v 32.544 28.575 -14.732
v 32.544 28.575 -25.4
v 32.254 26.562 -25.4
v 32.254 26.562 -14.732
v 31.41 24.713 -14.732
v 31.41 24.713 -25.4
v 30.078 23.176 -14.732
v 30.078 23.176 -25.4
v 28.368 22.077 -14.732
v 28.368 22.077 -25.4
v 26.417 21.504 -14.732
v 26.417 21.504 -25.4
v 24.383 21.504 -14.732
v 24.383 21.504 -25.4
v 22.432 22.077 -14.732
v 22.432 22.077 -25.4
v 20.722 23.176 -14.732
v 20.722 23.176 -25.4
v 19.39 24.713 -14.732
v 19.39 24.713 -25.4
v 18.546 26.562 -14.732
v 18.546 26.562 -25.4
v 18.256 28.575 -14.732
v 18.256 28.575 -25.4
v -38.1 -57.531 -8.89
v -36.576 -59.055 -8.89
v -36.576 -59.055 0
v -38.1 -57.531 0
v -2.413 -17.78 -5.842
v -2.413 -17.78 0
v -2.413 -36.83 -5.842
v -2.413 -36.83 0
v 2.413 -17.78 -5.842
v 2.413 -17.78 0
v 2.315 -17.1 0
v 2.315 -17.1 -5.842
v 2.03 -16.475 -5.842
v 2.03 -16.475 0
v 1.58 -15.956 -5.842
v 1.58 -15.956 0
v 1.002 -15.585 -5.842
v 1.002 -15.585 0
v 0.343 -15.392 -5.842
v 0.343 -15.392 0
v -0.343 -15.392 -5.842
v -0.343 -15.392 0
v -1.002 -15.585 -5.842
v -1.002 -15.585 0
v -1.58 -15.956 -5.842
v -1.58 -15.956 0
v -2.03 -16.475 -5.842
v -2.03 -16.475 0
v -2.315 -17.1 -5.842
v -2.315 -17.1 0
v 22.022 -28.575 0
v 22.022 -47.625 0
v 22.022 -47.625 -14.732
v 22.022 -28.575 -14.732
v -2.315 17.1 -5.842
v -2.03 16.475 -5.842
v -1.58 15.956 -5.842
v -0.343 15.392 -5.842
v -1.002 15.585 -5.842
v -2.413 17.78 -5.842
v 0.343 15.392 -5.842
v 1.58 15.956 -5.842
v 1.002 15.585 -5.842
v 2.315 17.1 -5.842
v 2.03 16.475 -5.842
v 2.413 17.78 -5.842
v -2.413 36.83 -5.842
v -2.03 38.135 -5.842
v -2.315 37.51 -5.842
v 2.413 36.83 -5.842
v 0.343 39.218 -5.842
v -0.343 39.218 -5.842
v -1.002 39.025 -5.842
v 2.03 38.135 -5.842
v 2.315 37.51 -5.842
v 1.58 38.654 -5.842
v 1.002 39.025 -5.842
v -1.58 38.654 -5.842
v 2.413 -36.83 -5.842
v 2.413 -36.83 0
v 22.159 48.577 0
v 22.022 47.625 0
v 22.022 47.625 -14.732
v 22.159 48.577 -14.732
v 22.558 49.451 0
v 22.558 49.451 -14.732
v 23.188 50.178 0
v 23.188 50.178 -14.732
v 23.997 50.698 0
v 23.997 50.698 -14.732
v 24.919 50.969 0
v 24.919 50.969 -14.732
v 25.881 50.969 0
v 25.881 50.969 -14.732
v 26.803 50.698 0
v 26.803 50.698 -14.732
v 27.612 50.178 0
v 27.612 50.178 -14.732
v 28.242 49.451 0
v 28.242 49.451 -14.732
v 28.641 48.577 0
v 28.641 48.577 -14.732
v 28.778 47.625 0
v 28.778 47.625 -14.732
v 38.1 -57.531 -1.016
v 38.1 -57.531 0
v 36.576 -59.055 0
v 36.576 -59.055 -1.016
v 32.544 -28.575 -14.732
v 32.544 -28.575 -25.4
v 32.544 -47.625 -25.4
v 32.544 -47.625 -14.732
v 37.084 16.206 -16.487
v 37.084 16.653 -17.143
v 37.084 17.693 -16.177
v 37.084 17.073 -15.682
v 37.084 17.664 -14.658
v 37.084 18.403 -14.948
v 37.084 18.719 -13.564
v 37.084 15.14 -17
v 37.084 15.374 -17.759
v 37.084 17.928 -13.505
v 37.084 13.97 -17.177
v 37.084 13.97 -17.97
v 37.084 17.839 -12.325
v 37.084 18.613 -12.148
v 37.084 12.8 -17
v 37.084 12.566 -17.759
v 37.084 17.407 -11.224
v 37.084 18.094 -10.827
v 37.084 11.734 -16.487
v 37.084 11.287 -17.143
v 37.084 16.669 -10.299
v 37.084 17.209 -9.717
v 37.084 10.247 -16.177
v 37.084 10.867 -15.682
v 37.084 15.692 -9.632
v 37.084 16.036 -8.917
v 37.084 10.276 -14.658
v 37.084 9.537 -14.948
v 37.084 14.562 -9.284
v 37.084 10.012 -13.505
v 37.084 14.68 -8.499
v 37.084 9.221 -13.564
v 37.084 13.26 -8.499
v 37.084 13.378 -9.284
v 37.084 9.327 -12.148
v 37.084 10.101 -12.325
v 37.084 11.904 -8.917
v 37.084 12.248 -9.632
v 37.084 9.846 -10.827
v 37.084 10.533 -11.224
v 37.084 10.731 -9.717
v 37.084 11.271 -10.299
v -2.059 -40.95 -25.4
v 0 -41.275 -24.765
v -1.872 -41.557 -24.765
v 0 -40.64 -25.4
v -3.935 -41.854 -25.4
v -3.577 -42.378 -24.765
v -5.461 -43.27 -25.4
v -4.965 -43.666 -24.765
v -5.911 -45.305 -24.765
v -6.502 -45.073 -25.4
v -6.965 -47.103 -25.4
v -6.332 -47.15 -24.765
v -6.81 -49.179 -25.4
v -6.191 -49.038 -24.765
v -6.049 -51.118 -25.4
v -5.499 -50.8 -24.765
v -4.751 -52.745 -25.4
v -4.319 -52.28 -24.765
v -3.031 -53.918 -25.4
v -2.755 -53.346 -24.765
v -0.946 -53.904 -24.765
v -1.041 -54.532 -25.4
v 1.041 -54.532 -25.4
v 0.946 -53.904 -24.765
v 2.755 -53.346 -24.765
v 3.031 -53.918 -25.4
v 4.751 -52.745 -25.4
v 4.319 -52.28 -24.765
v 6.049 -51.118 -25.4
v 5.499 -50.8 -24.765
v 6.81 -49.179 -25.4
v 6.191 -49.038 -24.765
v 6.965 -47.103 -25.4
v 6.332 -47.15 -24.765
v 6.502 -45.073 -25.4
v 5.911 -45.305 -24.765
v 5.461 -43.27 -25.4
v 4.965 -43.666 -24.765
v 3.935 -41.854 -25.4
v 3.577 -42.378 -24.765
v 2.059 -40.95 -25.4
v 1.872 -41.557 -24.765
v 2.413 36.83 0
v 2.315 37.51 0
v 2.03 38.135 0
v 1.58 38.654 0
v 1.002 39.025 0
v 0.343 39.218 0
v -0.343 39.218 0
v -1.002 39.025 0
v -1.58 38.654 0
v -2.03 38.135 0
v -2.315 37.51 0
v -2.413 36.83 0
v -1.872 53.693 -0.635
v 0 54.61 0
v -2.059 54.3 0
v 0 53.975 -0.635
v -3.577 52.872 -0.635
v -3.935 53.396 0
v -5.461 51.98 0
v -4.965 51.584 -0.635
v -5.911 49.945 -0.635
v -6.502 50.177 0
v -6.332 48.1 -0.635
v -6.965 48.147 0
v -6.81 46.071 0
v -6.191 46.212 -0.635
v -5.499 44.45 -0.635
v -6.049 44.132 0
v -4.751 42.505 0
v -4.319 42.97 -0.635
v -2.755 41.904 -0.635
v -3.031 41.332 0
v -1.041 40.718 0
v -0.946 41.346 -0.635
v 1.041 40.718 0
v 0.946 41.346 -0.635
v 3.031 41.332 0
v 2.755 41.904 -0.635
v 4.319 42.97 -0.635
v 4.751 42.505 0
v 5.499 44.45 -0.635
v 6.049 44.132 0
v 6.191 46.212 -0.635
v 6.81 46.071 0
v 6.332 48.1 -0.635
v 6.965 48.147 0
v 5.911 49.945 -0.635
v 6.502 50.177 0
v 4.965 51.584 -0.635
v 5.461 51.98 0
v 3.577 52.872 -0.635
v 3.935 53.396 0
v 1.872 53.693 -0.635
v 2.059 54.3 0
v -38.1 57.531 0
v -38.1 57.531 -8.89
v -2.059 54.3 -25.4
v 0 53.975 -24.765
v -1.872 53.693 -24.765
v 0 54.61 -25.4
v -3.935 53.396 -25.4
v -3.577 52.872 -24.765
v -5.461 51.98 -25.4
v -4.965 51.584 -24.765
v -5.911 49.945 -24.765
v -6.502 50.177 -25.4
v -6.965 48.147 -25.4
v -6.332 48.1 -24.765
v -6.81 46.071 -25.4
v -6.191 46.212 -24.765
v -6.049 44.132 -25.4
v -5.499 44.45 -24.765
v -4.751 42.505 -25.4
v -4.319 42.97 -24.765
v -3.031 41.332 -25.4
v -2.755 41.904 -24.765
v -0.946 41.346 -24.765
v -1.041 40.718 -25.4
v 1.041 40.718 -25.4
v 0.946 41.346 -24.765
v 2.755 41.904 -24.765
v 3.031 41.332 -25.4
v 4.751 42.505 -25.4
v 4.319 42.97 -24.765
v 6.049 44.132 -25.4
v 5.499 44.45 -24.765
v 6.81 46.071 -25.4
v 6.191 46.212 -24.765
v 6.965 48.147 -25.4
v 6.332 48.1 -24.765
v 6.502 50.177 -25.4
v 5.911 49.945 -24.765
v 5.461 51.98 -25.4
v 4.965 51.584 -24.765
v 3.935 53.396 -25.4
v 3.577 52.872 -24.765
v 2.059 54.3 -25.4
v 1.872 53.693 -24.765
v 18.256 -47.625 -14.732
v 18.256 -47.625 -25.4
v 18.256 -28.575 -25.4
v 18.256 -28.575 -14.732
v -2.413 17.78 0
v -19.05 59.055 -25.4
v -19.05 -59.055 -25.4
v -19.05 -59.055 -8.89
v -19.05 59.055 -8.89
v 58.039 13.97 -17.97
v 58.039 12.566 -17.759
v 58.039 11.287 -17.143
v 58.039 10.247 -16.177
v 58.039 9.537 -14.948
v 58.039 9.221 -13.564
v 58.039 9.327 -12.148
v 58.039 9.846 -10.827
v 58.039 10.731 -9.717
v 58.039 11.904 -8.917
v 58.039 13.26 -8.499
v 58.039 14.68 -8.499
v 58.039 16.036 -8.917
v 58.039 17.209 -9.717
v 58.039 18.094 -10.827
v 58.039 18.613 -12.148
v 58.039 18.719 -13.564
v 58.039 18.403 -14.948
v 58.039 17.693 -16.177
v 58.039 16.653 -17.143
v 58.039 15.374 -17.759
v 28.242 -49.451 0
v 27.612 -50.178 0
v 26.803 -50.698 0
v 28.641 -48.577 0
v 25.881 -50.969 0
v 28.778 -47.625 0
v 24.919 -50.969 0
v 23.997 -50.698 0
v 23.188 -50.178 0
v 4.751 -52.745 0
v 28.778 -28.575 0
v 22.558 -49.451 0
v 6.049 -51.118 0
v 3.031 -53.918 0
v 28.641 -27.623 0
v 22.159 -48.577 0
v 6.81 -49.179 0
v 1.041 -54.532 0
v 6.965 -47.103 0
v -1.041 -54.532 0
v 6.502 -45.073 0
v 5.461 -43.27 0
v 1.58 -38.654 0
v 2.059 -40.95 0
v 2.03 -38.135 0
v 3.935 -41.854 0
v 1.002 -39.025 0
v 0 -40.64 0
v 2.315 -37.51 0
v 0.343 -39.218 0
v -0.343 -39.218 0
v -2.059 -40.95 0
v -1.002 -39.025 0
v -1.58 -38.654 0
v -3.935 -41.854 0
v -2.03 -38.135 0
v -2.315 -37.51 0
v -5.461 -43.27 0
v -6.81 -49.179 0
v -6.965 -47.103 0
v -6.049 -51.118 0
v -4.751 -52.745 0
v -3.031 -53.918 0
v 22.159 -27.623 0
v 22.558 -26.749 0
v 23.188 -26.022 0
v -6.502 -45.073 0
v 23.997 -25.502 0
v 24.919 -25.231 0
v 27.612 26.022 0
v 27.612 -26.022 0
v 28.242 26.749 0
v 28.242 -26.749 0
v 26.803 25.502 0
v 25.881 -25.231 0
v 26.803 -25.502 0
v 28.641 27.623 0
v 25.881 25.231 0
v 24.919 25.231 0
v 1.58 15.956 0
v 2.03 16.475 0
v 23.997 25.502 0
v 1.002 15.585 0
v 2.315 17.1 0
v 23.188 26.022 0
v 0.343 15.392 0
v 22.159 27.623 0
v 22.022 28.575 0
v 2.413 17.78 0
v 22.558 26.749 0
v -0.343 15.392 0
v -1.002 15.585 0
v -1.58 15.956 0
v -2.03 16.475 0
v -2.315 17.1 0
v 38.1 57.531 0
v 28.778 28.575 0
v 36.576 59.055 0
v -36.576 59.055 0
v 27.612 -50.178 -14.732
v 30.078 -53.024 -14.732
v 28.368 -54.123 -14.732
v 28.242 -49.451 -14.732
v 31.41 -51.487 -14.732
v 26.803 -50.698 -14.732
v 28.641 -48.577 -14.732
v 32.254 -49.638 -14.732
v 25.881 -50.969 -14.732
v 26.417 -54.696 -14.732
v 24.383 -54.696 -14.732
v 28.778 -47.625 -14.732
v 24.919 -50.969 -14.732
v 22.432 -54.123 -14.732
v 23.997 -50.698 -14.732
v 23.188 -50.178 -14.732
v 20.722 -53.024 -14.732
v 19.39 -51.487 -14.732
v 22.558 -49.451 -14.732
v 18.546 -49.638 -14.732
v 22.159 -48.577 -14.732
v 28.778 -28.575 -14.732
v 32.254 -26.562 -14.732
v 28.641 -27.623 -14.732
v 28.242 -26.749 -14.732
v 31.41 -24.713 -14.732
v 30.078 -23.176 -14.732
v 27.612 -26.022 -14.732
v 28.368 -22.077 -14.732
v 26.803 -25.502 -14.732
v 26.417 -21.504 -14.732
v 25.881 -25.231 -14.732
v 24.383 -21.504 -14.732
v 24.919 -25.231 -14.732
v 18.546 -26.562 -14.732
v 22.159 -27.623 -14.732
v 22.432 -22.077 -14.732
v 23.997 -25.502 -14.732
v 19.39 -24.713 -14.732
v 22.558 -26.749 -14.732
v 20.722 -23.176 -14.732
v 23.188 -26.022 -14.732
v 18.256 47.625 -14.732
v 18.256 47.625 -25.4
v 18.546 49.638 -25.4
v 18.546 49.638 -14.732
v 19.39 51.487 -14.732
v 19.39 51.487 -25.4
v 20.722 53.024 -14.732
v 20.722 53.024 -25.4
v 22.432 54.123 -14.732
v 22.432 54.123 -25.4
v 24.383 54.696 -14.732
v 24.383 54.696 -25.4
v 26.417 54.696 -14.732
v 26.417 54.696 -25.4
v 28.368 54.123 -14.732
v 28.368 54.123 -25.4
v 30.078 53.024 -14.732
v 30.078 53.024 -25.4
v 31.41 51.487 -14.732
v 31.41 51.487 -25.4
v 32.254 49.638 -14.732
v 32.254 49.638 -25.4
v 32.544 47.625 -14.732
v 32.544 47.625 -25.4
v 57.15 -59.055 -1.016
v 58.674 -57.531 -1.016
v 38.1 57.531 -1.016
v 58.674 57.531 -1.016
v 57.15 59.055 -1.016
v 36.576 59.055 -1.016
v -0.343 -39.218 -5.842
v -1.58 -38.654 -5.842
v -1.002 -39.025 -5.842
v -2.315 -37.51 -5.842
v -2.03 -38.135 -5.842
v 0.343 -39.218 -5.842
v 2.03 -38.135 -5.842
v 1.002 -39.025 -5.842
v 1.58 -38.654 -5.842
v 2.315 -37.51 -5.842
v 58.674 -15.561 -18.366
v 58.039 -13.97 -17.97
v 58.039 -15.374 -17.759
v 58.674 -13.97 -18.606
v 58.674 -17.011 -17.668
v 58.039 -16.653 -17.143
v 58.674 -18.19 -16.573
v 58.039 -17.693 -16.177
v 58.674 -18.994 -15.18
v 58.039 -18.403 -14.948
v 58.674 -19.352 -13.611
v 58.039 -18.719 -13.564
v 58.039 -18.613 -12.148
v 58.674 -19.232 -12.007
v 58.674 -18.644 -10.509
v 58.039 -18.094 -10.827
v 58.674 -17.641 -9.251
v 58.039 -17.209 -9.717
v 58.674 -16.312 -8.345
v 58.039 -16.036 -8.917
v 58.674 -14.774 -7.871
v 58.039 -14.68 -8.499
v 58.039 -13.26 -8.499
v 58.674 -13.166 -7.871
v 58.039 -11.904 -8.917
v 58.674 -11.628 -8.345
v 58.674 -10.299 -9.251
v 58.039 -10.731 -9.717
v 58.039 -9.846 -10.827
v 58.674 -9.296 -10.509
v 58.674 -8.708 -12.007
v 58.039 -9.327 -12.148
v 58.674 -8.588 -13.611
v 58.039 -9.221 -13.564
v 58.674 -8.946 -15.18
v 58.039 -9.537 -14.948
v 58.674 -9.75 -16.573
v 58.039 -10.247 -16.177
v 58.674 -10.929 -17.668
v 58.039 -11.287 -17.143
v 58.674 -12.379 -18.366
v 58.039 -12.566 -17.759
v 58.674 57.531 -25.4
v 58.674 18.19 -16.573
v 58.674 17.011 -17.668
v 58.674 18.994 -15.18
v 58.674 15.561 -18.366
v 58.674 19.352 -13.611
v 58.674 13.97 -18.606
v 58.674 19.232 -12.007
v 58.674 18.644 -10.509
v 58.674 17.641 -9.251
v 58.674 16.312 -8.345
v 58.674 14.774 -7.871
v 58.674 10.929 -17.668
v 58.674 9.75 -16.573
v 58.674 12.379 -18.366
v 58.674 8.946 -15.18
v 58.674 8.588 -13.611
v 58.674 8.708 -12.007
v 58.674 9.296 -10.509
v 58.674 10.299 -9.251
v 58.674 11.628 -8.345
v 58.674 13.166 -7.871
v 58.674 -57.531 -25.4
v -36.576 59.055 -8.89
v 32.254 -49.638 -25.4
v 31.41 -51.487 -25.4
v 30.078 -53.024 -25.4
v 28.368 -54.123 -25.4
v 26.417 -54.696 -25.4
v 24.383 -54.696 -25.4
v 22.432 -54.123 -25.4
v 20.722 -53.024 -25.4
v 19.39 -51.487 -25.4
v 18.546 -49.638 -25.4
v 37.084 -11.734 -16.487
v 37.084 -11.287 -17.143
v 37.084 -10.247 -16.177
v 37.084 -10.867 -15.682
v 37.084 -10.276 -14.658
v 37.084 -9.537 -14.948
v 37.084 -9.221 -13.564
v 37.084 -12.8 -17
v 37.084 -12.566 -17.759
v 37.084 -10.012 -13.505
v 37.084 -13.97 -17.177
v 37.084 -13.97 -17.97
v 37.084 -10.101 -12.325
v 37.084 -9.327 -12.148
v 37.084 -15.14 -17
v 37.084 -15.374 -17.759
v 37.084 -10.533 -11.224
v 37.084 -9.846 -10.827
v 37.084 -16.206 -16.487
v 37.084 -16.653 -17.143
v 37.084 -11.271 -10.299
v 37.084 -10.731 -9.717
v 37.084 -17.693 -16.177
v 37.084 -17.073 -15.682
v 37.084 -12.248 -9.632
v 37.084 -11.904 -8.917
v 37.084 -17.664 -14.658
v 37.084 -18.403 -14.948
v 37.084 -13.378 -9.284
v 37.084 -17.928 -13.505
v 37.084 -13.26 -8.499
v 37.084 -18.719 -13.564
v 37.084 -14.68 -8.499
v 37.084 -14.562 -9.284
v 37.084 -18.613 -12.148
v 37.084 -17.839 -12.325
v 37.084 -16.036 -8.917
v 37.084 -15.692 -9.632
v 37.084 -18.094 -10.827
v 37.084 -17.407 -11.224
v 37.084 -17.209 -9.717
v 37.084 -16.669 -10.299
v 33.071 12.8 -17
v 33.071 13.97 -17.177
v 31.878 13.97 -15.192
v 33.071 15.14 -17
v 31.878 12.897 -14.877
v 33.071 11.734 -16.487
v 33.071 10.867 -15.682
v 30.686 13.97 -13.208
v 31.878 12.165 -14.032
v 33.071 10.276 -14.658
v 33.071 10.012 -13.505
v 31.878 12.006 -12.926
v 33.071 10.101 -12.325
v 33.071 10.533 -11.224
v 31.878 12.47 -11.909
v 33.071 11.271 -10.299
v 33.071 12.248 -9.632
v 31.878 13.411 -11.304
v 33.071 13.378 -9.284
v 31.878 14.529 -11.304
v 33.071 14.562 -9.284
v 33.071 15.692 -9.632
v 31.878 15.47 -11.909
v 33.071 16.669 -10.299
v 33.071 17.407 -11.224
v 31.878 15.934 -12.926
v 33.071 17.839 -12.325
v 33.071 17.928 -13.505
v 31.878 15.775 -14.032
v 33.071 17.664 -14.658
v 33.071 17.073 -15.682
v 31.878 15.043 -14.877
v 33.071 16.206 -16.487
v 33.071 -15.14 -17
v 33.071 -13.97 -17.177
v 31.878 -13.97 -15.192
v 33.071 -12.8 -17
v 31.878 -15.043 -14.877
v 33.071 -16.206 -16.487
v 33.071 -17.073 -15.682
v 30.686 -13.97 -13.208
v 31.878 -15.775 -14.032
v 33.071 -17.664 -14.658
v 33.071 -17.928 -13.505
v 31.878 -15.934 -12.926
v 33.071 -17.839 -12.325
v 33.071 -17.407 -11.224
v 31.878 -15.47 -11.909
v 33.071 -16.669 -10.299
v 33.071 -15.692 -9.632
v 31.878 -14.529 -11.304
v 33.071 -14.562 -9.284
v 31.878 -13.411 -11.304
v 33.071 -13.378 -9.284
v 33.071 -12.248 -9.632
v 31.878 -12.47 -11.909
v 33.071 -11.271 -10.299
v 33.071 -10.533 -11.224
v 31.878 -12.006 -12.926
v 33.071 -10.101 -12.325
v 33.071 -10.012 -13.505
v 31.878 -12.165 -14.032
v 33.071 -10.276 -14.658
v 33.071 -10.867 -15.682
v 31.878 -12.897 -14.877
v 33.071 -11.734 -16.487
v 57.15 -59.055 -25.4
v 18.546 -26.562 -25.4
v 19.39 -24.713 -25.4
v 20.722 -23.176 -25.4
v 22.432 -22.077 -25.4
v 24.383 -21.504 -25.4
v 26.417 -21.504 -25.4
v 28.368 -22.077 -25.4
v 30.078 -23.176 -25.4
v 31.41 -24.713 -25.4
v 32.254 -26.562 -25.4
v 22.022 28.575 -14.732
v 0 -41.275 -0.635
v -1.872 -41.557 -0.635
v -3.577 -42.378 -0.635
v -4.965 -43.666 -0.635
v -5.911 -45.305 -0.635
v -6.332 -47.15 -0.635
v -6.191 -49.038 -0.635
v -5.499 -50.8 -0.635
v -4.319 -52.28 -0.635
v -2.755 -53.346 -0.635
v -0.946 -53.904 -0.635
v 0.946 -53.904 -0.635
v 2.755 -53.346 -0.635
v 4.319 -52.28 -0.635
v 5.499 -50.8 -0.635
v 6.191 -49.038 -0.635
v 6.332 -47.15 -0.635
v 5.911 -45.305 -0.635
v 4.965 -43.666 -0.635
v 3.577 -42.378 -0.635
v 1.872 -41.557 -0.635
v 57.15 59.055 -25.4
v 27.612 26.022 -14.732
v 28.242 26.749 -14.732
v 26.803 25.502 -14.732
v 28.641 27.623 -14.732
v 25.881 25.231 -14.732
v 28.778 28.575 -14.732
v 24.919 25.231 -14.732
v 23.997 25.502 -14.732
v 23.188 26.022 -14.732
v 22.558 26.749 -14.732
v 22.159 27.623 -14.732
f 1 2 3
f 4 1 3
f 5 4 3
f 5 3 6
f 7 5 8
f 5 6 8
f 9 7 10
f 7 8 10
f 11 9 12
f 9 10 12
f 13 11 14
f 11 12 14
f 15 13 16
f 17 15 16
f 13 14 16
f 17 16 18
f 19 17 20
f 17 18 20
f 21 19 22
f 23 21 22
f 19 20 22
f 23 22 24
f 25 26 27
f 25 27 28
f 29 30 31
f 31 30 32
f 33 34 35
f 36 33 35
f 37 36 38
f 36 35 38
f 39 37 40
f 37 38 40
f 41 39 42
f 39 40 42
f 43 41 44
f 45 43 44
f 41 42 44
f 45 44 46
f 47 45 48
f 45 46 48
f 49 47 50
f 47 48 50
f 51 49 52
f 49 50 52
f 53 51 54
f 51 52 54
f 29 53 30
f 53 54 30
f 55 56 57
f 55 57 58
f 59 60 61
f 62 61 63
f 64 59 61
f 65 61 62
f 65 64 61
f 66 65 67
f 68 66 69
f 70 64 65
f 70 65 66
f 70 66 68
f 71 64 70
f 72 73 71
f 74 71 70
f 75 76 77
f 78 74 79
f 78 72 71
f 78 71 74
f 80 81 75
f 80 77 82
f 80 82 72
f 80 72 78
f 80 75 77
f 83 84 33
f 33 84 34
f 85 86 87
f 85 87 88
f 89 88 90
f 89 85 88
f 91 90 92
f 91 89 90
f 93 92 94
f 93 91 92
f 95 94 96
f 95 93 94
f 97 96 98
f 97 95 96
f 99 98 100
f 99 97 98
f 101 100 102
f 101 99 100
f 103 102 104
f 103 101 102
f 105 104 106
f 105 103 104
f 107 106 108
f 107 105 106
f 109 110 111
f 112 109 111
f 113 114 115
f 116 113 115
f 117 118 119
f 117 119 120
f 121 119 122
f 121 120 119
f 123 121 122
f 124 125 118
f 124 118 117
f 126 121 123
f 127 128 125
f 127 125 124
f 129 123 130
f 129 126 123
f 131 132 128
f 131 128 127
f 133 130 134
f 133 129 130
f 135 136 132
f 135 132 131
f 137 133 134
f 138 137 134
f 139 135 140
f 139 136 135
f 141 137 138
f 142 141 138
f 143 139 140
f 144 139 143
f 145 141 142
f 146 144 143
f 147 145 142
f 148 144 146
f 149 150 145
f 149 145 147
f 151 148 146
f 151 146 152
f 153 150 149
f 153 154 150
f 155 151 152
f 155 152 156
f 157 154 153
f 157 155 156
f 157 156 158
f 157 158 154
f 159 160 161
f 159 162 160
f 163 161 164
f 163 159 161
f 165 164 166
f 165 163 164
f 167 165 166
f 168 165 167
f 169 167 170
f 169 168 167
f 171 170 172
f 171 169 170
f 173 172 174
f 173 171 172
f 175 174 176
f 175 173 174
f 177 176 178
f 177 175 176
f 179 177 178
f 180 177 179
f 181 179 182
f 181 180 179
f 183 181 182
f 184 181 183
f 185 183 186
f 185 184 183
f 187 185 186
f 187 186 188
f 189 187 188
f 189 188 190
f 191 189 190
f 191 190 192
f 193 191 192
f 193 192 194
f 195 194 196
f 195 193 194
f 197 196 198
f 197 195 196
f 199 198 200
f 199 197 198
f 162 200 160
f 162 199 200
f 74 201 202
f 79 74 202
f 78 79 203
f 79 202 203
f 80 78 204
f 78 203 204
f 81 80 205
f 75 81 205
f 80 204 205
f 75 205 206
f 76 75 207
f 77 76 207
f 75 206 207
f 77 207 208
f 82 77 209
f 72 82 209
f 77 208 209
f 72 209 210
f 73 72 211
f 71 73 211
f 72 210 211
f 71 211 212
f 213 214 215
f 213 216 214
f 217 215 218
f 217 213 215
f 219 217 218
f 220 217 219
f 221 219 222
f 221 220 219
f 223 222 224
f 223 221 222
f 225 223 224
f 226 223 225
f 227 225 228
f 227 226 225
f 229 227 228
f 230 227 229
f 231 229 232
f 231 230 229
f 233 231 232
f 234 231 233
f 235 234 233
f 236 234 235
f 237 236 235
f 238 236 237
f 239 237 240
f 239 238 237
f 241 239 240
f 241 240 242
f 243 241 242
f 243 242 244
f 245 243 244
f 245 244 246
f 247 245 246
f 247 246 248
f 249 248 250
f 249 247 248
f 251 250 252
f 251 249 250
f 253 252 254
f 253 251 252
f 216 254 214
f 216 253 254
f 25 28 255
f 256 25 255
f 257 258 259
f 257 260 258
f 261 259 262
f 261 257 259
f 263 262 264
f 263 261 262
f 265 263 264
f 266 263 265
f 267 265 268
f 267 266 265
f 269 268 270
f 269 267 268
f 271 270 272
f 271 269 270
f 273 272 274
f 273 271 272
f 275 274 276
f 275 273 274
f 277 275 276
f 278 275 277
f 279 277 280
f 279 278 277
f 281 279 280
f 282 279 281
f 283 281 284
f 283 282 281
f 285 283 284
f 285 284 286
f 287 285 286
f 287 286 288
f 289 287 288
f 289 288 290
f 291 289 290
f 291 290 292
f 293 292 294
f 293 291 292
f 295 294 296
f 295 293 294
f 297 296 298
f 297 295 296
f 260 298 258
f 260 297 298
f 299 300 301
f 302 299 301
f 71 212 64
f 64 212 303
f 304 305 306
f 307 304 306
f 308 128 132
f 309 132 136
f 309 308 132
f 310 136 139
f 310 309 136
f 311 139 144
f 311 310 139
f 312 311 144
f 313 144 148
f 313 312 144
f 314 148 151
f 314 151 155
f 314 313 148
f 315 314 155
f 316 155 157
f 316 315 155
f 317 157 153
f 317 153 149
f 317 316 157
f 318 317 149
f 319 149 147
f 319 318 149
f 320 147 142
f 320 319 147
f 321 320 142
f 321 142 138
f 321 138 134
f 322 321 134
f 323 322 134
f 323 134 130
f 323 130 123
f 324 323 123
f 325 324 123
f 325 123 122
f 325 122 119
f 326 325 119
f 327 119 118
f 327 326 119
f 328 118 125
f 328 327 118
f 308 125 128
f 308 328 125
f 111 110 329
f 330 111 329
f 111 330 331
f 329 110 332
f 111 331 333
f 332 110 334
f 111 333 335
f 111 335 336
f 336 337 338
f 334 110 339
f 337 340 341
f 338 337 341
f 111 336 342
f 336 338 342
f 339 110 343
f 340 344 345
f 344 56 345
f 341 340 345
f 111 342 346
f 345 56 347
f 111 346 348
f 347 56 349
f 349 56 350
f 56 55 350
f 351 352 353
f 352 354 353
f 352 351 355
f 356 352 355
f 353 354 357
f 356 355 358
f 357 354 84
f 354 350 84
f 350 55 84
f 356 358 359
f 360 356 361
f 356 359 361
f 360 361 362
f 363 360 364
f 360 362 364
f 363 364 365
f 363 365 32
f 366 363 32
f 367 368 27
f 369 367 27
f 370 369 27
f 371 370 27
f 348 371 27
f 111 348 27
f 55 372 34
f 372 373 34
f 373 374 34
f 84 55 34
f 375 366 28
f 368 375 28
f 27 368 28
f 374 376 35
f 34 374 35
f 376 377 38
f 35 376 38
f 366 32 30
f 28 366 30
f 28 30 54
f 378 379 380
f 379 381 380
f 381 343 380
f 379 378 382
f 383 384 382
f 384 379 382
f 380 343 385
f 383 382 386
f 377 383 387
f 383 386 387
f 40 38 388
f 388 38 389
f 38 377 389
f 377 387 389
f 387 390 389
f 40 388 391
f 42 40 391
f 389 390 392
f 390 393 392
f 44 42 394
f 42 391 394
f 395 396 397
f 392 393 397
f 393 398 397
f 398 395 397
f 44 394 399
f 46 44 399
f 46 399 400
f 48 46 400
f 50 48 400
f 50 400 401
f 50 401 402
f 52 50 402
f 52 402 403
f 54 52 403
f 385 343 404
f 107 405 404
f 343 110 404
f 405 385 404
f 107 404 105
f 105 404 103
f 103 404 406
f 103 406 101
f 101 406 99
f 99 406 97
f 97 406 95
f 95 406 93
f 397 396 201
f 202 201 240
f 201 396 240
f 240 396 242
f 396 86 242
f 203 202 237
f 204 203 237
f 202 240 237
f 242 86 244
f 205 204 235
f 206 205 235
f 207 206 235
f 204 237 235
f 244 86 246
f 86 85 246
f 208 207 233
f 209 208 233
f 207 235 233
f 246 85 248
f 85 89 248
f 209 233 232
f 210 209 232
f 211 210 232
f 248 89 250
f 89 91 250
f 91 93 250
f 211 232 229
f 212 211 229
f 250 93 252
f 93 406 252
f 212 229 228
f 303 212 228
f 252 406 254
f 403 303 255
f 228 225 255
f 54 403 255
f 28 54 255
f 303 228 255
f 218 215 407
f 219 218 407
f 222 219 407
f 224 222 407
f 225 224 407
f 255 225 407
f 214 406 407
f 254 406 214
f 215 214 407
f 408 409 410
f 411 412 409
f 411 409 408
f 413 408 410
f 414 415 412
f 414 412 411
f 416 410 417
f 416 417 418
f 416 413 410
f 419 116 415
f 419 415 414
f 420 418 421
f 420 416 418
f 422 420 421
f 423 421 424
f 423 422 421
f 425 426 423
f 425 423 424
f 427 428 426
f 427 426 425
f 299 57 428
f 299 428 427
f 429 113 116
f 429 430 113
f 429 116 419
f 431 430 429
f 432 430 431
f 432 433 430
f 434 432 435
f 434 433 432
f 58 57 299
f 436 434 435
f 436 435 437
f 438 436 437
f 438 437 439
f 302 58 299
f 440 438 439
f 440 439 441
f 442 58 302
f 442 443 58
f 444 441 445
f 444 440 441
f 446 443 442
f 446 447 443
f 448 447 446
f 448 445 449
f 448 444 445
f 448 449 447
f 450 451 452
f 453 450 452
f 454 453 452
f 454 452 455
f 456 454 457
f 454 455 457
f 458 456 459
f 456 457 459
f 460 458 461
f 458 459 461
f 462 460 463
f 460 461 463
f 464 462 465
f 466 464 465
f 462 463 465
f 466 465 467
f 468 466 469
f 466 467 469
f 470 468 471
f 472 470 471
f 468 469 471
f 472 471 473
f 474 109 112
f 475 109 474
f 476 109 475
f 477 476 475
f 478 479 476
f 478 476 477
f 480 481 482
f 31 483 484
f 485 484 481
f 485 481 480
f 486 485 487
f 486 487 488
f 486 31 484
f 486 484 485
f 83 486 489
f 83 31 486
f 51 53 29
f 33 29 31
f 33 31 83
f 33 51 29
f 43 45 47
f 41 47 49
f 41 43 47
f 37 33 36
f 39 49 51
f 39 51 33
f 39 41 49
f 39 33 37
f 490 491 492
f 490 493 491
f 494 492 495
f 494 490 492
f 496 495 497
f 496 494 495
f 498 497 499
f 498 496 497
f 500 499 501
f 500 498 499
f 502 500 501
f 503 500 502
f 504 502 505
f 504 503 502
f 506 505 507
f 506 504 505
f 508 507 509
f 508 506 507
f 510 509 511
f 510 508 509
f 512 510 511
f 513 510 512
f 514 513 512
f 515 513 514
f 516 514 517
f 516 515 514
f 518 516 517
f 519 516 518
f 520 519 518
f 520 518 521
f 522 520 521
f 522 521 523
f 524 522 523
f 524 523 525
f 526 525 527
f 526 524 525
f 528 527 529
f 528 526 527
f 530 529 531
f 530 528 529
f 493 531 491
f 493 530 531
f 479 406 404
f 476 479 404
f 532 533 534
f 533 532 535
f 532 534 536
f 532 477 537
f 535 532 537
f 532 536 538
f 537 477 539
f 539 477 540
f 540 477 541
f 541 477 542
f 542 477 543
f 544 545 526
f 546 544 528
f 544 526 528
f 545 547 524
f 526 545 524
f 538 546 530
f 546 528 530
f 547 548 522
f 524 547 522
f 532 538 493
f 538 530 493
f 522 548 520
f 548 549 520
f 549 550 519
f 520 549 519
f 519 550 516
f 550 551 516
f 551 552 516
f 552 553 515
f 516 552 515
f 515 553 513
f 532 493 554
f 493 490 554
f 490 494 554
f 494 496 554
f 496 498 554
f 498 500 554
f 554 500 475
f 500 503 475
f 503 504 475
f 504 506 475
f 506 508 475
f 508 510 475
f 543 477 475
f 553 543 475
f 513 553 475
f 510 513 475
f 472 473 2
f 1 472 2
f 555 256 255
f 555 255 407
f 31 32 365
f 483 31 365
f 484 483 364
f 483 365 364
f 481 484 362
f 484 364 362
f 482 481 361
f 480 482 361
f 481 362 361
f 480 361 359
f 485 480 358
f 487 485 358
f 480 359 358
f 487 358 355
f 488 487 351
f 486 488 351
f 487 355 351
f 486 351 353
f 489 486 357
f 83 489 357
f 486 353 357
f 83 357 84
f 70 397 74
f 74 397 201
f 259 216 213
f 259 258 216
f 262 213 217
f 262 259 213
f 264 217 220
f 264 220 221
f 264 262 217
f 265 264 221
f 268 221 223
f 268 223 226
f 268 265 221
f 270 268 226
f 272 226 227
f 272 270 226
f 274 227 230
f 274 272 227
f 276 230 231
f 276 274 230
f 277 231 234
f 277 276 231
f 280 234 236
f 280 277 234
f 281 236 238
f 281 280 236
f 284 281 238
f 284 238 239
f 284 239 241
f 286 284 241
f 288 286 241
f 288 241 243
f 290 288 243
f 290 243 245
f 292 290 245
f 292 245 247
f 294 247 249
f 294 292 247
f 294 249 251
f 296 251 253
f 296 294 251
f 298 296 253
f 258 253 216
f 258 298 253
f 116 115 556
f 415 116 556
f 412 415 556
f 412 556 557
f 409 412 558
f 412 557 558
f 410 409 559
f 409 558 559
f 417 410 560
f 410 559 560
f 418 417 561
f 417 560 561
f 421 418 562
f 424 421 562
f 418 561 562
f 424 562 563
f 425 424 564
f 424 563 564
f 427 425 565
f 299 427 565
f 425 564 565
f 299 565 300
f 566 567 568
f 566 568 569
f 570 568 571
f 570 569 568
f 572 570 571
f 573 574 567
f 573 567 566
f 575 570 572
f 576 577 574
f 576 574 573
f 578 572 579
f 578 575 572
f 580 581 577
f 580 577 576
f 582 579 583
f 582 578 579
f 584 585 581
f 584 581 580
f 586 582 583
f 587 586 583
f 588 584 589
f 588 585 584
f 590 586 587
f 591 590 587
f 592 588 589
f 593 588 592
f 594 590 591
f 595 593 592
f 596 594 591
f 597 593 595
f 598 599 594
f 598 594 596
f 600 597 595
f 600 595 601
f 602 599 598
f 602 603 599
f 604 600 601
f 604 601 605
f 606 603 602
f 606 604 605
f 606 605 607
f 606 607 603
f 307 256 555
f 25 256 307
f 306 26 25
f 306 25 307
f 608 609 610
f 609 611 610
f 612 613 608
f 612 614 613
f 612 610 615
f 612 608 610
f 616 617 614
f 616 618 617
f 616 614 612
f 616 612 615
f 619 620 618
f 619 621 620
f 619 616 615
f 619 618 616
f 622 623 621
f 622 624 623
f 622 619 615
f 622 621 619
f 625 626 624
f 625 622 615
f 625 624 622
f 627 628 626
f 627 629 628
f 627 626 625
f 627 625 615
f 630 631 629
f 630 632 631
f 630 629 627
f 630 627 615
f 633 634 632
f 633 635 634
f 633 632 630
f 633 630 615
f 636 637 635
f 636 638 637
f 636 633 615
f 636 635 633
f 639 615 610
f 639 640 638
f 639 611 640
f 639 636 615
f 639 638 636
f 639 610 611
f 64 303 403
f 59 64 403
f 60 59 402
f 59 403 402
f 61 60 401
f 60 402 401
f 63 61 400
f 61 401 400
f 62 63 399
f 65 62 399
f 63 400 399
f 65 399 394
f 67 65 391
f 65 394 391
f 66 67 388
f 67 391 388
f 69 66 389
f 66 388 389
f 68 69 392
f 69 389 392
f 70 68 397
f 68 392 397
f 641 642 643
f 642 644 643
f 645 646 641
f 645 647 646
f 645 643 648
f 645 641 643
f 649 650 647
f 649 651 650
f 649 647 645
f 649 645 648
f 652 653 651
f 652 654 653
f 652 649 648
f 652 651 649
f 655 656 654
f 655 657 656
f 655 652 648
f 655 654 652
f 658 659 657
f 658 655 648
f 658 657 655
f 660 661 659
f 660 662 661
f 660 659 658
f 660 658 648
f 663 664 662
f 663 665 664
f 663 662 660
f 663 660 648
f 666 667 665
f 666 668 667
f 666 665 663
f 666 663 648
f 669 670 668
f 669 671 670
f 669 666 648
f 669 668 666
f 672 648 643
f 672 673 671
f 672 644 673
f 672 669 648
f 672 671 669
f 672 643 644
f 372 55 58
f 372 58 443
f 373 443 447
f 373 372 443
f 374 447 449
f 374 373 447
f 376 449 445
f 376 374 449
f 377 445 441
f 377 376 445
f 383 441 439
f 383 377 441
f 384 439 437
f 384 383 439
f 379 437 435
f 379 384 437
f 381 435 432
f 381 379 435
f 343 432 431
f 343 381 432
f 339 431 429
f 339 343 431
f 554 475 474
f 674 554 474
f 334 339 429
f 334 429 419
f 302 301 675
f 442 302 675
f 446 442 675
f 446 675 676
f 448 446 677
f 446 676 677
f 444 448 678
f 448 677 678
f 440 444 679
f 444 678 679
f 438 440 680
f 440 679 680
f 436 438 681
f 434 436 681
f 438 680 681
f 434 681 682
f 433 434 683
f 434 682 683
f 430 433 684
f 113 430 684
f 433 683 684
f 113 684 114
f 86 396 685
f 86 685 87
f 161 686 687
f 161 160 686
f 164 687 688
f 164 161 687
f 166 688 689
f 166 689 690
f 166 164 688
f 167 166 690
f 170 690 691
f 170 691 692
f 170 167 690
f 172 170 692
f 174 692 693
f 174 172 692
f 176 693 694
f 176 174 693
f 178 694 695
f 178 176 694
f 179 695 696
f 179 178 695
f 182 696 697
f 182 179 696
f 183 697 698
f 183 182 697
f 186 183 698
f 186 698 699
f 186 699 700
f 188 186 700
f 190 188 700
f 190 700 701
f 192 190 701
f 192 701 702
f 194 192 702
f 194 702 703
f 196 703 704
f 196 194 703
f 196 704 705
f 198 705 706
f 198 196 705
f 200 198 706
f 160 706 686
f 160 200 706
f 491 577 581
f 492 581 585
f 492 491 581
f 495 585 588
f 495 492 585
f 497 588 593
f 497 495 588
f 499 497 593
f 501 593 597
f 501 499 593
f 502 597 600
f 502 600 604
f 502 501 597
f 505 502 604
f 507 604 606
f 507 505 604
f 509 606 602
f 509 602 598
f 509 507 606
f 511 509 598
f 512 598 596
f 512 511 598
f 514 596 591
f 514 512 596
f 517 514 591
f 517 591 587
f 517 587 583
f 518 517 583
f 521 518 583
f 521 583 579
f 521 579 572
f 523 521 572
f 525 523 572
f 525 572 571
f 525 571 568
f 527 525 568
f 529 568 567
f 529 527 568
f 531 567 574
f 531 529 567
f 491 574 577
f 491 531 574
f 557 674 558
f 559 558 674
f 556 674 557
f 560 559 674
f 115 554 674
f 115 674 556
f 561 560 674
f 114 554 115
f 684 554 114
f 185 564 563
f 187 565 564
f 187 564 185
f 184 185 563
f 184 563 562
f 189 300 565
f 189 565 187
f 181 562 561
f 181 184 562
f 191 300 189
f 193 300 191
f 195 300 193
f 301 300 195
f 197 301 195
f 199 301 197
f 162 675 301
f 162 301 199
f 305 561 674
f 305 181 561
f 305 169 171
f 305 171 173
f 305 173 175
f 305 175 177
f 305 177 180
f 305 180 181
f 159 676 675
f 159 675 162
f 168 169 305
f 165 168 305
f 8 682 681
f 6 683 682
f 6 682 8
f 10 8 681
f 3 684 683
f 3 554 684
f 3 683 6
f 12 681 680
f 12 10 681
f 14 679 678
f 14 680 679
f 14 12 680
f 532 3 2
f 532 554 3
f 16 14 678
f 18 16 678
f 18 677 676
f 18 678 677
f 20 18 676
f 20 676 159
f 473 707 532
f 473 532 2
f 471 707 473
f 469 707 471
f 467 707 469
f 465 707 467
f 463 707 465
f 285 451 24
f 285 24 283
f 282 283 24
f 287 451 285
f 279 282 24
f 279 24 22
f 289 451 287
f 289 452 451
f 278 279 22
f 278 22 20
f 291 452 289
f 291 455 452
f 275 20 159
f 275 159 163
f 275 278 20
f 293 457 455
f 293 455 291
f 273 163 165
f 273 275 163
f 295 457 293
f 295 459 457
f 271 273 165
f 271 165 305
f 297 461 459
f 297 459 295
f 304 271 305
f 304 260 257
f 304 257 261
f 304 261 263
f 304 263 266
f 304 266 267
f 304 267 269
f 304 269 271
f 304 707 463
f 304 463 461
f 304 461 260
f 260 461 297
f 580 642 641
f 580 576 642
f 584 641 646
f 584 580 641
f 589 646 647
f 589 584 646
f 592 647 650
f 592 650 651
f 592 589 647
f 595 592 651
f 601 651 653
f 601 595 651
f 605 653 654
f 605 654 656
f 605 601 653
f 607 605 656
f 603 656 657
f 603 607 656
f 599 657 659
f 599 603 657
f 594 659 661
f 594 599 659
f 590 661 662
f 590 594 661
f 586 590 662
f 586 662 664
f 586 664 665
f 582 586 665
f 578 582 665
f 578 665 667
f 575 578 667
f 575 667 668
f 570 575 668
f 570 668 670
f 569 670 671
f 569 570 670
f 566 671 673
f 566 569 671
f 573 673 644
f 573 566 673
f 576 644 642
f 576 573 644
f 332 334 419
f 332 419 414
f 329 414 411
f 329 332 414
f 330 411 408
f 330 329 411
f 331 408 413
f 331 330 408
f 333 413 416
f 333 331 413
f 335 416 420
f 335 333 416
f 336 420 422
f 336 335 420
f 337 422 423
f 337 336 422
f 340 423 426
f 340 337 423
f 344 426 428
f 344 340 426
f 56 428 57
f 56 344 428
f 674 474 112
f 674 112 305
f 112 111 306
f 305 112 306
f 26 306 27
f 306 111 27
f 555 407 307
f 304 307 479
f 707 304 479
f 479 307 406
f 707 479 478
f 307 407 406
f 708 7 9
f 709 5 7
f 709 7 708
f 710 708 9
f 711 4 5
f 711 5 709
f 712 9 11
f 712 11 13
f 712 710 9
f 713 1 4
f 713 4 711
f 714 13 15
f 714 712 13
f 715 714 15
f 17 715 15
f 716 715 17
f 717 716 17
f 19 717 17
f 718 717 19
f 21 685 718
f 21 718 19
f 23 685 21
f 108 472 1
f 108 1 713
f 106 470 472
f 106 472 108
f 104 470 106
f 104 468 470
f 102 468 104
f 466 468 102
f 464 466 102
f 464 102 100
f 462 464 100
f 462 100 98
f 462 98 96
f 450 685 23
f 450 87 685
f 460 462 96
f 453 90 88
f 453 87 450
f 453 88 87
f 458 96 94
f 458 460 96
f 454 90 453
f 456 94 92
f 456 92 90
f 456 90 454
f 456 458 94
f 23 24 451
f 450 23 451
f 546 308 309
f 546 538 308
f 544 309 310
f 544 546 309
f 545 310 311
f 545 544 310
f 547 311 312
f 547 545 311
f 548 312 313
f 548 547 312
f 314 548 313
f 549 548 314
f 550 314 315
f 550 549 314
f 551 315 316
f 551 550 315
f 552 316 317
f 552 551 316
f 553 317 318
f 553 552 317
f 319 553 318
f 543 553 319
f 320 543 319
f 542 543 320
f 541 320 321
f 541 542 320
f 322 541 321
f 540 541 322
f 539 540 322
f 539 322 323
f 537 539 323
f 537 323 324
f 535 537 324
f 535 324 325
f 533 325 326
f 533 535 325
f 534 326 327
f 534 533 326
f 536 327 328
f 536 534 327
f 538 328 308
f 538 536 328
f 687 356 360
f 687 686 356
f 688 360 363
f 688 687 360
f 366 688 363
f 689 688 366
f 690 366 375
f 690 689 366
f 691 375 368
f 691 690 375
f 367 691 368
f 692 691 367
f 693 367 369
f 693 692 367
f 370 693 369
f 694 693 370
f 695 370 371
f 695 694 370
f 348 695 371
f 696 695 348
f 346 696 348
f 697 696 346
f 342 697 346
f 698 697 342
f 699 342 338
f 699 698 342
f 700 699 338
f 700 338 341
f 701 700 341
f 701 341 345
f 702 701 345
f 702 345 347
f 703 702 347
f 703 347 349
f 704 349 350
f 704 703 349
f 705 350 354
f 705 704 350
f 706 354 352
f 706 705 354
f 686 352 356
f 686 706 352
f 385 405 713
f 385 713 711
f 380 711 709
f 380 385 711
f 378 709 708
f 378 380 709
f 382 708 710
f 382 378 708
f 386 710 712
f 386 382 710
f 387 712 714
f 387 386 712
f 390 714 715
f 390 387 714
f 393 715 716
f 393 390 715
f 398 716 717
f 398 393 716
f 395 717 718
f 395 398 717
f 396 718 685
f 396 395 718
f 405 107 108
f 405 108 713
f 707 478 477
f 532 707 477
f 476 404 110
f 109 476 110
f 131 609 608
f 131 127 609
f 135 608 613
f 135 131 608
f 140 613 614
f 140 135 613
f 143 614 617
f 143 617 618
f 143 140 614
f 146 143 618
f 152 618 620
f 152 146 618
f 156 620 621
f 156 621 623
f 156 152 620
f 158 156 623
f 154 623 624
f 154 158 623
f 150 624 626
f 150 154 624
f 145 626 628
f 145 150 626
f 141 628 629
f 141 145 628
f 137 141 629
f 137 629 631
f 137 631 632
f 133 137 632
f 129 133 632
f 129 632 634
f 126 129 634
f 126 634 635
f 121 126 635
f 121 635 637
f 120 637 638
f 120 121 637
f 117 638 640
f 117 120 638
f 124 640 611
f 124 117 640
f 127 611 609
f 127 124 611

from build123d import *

# Parameters (mm, degrees)
BOSS_EXTRUDE1_DEPTH              = 25.4
F_1_2_13_TAPPED_HOLE1_AT_2_COUNT = 2
F_1_2_13_TAPPED_HOLE1_AT_2_PITCH = 95.25
CUT_EXTRUDE1_DEPTH               = 5.842
CUT_EXTRUDE2_DEPTH               = 1.016
F_3_8_16_TAPPED_HOLE1_AT_2_COUNT = 2
F_3_8_16_TAPPED_HOLE1_AT_2_PITCH = 27.94
CUT_EXTRUDE3_DEPTH               = 26.4
CUT_EXTRUDE4_DEPTH               = 10.668
SKETCH15_W                       = 19.05
SKETCH15_H                       = 16.51
CUT_EXTRUDE5_DEPTH               = 119.11


with BuildPart() as part:
    # Sketch6 → Boss-Extrude1 (new body)
    with BuildSketch(Plane.XY):
        Polygon((-36.576, 59.055), (57.15, 59.055), (58.674, 57.531), (58.674, -57.531), (57.15, -59.055), (-36.576, -59.055), (-38.1, -57.531), (-38.1, 57.531), align=None)
    extrude(amount=-BOSS_EXTRUDE1_DEPTH)

    # Sketch7 → 1/2-13 Tapped Hole1 (revolve, cut)
    with BuildSketch(Plane(origin=(0, 47.625, -25.4), x_dir=(0, 1, 0), z_dir=(1, 0, 0))):
        Polygon((0, 0), (0, 25.4), (6.985, 25.4), (6.35, 24.765), (6.35, 0.635), (6.985, 0), align=None)
    f_1_2_13_tapped_hole1 = revolve(axis=Axis((0, 47.625, -31.75), (0, 0, 1)), mode=Mode.SUBTRACT)

    # 1/2-13 Tapped Hole1 at 2: 1/2-13 Tapped Hole1 ×2
    with Locations(*[(0, -i * F_1_2_13_TAPPED_HOLE1_AT_2_PITCH, 0) for i in range(1, F_1_2_13_TAPPED_HOLE1_AT_2_COUNT)]):
        add(f_1_2_13_tapped_hole1, mode=Mode.SUBTRACT)

    # Sketch9 → Cut-Extrude1 (cut)
    with BuildSketch(Plane(origin=(0, 0, 0), x_dir=(-1, 0, 0), z_dir=(0, 0, -1))):
        with BuildLine():
            Line((-2.413, 17.78), (-2.413, 36.83))
            ThreePointArc((-2.413, 36.83), (0, 39.243), (2.413, 36.83))
            Line((2.413, 36.83), (2.413, 17.78))
            ThreePointArc((2.413, 17.78), (0, 15.367), (-2.413, 17.78))
        make_face()
        with BuildLine():
            Line((2.413, -17.78), (2.413, -36.83))
            ThreePointArc((2.413, -36.83), (0, -39.243), (-2.413, -36.83))
            Line((-2.413, -36.83), (-2.413, -17.78))
            ThreePointArc((-2.413, -17.78), (0, -15.367), (2.413, -17.78))
        make_face()
    extrude(amount=CUT_EXTRUDE1_DEPTH, mode=Mode.SUBTRACT)

    # Sketch12 → Cut-Extrude2 (cut)
    with BuildSketch(Plane.XY):
        Polygon((38.1, 57.531), (38.1, -57.531), (36.576, -59.055), (57.15, -59.055), (58.674, -57.531), (58.674, 57.531), (57.15, 59.055), (36.576, 59.055), align=None)
    extrude(amount=-CUT_EXTRUDE2_DEPTH, mode=Mode.SUBTRACT)

    # Sketch10 → 3/8-16 Tapped Hole1 (revolve, cut)
    with BuildSketch(Plane(origin=(58.674, 13.97, -13.208), x_dir=(0, 0, -1), z_dir=(0, 1, 0))):
        Polygon((0, 0), (0, 27.987865582), (3.96875, 25.6032), (3.96875, 21.59), (4.7625, 21.59), (4.7625, 0.635), (5.3975, 0), align=None)
    f_3_8_16_tapped_hole1 = revolve(axis=Axis((65.024, 13.97, -13.208), (-1, 0, 0)), mode=Mode.SUBTRACT)

    # 3/8-16 Tapped Hole1 at 2: 3/8-16 Tapped Hole1 ×2
    with Locations(*[(0, -i * F_3_8_16_TAPPED_HOLE1_AT_2_PITCH, 0) for i in range(1, F_3_8_16_TAPPED_HOLE1_AT_2_COUNT)]):
        add(f_3_8_16_tapped_hole1, mode=Mode.SUBTRACT)

    # Sketch13 → Cut-Extrude3 (cut, through all)
    with BuildSketch(Plane.XY):
        with BuildLine():
            Line((28.7782, 47.625), (28.7782, 28.575))
            ThreePointArc((28.7782, 28.575), (25.4, 25.1968), (22.0218, 28.575))
            Line((22.0218, 28.575), (22.0218, 47.625))
            ThreePointArc((22.0218, 47.625), (25.4, 51.0032), (28.7782, 47.625))
        make_face()
        with BuildLine():
            Line((28.7782, -28.575), (28.7782, -47.625))
            ThreePointArc((28.7782, -47.625), (25.4, -51.0032), (22.0218, -47.625))
            Line((22.0218, -47.625), (22.0218, -28.575))
            ThreePointArc((22.0218, -28.575), (25.4, -25.1968), (28.7782, -28.575))
        make_face()
    extrude(amount=-CUT_EXTRUDE3_DEPTH, mode=Mode.SUBTRACT)

    # Sketch14 → Cut-Extrude4 (cut)
    with BuildSketch(Plane.XY.offset(-25.4)):
        with BuildLine():
            Line((32.54375, 47.625), (32.54375, 28.575))
            ThreePointArc((32.54375, 28.575), (25.4, 21.43125), (18.25625, 28.575))
            Line((18.25625, 28.575), (18.25625, 47.625))
            ThreePointArc((18.25625, 47.625), (25.4, 54.76875), (32.54375, 47.625))
        make_face()
        with BuildLine():
            Line((32.54375, -28.575), (32.54375, -47.625))
            ThreePointArc((32.54375, -47.625), (25.4, -54.76875), (18.25625, -47.625))
            Line((18.25625, -47.625), (18.25625, -28.575))
            ThreePointArc((18.25625, -28.575), (25.4, -21.43125), (32.54375, -28.575))
        make_face()
    extrude(amount=CUT_EXTRUDE4_DEPTH, mode=Mode.SUBTRACT)

    # Sketch15 → Cut-Extrude5 (cut, through all)
    with BuildSketch(Plane.XZ.offset(59.055)):
        with Locations((-28.575, -17.145)):
            Rectangle(SKETCH15_W, SKETCH15_H)
    extrude(amount=-CUT_EXTRUDE5_DEPTH, mode=Mode.SUBTRACT)


solid = part.part
